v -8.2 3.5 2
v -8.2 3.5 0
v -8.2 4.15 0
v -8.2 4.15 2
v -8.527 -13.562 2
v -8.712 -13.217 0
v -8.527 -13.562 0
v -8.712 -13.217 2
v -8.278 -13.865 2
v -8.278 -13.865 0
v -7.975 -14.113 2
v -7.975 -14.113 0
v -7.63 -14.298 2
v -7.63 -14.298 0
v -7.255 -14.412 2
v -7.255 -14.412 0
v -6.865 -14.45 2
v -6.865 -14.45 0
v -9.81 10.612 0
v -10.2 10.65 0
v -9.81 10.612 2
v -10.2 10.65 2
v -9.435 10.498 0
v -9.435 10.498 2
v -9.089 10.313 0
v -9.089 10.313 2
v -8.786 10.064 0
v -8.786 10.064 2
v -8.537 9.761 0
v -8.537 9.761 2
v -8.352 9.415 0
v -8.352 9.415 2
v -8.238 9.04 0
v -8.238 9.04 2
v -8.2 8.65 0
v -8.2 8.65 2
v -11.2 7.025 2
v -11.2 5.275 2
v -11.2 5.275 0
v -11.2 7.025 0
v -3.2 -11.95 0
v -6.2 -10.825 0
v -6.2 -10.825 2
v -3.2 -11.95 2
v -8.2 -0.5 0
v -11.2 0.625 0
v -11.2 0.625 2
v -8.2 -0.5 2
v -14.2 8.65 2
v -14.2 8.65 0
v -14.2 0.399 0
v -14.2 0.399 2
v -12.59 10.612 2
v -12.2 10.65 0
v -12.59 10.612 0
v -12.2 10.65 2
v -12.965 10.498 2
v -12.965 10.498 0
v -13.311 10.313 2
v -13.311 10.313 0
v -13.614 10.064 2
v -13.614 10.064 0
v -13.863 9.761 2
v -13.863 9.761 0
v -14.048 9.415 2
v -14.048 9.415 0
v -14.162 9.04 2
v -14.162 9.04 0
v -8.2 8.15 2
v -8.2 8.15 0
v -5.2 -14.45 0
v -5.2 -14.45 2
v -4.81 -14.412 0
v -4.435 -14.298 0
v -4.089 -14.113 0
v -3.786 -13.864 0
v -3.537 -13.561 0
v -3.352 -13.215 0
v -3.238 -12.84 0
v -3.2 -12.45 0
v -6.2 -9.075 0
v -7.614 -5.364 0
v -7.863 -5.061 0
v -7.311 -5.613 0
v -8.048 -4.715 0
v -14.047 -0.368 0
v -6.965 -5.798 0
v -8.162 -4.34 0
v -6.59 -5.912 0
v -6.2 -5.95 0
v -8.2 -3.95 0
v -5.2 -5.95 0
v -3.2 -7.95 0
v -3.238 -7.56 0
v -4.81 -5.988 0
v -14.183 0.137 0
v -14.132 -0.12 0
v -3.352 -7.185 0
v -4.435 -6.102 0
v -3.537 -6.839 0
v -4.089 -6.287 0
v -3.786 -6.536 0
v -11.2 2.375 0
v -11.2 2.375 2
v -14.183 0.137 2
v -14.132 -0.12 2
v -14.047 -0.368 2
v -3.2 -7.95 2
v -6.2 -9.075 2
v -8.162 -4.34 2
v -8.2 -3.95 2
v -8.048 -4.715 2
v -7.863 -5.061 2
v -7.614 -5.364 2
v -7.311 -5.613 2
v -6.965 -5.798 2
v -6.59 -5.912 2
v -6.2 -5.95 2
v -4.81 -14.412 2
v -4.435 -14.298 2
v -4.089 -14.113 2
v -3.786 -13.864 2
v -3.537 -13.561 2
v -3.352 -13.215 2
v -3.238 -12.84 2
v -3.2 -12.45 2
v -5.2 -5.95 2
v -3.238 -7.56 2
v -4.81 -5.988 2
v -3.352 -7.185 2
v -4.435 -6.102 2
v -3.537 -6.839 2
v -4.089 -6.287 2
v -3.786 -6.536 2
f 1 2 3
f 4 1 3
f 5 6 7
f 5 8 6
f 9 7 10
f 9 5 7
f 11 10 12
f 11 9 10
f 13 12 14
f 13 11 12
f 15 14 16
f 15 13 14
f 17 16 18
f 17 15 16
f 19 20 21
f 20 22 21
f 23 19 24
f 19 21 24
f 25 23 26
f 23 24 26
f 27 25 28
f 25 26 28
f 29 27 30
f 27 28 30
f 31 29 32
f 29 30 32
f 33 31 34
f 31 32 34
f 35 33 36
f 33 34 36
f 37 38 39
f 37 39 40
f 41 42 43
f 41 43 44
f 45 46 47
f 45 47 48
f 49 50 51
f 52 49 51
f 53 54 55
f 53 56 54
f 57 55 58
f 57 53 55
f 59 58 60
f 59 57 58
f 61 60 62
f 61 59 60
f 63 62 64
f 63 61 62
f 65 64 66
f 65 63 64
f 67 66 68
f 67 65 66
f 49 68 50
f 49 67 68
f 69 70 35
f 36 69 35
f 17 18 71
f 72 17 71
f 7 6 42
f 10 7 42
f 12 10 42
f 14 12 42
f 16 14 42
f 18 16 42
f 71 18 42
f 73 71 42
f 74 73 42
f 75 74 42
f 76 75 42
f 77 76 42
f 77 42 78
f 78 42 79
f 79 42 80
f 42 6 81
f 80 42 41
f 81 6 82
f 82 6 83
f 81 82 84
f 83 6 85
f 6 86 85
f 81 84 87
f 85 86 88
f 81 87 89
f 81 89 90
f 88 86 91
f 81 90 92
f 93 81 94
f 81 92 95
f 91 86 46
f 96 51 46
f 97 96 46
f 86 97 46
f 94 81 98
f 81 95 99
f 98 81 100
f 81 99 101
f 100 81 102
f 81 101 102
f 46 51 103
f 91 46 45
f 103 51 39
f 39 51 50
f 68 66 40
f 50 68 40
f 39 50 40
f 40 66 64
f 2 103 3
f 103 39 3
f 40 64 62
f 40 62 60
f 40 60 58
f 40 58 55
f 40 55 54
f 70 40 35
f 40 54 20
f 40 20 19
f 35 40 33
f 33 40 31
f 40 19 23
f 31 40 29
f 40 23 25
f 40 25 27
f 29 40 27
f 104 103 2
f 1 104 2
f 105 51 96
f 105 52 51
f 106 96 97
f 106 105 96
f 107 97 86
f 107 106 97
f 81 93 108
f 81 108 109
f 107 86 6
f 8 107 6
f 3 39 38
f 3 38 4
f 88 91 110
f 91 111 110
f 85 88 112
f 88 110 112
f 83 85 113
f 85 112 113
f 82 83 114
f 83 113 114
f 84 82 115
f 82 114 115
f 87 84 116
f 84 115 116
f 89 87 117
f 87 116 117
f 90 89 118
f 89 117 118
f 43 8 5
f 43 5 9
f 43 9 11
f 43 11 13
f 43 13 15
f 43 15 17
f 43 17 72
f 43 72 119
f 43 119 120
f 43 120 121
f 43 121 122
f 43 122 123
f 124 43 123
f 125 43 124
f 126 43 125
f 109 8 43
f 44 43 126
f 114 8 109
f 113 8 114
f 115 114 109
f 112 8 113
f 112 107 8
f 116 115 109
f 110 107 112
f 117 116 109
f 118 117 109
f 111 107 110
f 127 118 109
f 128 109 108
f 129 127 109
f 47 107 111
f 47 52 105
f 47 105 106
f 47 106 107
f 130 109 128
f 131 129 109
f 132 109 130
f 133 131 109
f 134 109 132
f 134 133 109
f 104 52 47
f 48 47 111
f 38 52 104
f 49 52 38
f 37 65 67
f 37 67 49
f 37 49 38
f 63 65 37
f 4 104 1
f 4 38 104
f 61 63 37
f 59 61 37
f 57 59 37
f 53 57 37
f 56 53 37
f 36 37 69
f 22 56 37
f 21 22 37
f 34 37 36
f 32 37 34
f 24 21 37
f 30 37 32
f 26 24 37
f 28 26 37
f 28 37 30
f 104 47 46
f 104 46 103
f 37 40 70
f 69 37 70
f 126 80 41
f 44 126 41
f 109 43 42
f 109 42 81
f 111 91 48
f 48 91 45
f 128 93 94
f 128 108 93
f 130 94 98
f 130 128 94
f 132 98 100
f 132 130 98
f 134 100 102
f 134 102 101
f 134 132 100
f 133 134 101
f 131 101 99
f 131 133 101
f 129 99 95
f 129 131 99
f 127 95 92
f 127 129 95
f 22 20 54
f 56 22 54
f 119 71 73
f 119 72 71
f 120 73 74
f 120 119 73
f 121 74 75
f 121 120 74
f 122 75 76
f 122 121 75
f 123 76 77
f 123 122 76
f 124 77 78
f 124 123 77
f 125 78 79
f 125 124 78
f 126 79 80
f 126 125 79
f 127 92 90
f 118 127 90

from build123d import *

# Parameters (mm, degrees)
F1_DEPTH     = 2
F2_R         = 2
F3_R         = 2
F4_T4_DEPTH  = 22.7509646446
F4_T9_DEPTH  = 22.7509646446
F4_T14_DEPTH = 22.7509646446
F5_T4_DEPTH  = 22.7509646446
F5_T9_DEPTH  = 22.7509646446
F6_T4_DEPTH  = 22.7509646446


# Not quite as in the source:
# - a fillet or chamfer that OpenCascade refuses, or shapes differently, is made with other operations: its cross-section is extruded or revolved along the edge and cut away or added


with BuildPart() as f1:
    # F0 (on Top) → F1 (new body)
    with BuildSketch(Plane.XY):
        Polygon((-8.2, 10.65), (-14.2, 10.65), (-14.2, 0), (-8.2, -14.45), (-3.2, -14.45), (-3.2, -10.45), (-6.2, -10.45), (-6.2, -9.45), (-3.2, -9.45), (-3.2, -5.95), (-8.2, -5.95), (-8.2, 1), (-11.2, 1), (-11.2, 2), (-8.2, 2), (-8.2, 5.65), (-11.2, 5.65), (-11.2, 6.65), (-8.2, 6.65), align=None)
    extrude(amount=F1_DEPTH)

    # F2
    f2_edges = [f1.edges().sort_by_distance(p)[0] for p in [
        (-14.2, 10.65, 1),
        (-14.2, 0, 1),
        (-8.2, 10.65, 1),
        (-8.2, -14.45, 1),
        (-3.2, -14.45, 1),
        (-3.2, -5.95, 1),
    ]]
    fillet(f2_edges, radius=F2_R)

    # F3
    f3_edges = [f1.edges().sort_by_distance(p)[0] for p in [
        (-8.2, -5.95, 1),
    ]]
    fillet(f3_edges, radius=F3_R)

    # F4: chamfer of 1.5 x 4 on 3 edges, made by hand


with BuildPart() as f4_tool2:
    # F4_s3 → F4_t4 (new body)
    with BuildSketch(Plane.XY.offset(-10.3754823223)):
        Polygon((-12.2, 6.65), (-8.2, 8.15), (-8.2, 6.65), align=None)
    extrude(amount=F4_T4_DEPTH)

    split(bisect_by=Plane.YZ.offset(-11.2), keep=Keep.TOP)


with BuildPart() as f1_1:
    add(f1.part)

    # F4_t1: cut F4_tool2
    add(f4_tool2.part, mode=Mode.SUBTRACT)


with BuildPart() as f4_tool7:
    # F4_s8 → F4_t9 (new body)
    with BuildSketch(Plane.XY.offset(-10.3754823223)):
        Polygon((-12.2, 2), (-8.2, 3.5), (-8.2, 2), align=None)
    extrude(amount=F4_T9_DEPTH)

    split(bisect_by=Plane.YZ.offset(-11.2), keep=Keep.TOP)


with BuildPart() as f1_2:
    add(f1_1.part)

    # F4_t6: cut F4_tool7
    add(f4_tool7.part, mode=Mode.SUBTRACT)


with BuildPart() as f4_tool12:
    # F4_s13 → F4_t14 (new body)
    with BuildSketch(Plane.XY.offset(-10.3754823223)):
        Polygon((-3.2, -7.95), (-7.2, -9.45), (-3.2, -9.45), align=None)
    extrude(amount=F4_T14_DEPTH)

    split(bisect_by=Plane.YZ.offset(-6.2), keep=Keep.TOP)


with BuildPart() as f1_3:
    add(f1_2.part)

    # F4_t11: cut F4_tool12
    add(f4_tool12.part, mode=Mode.SUBTRACT)

    # F5: chamfer of 4 x 1.5 on 2 edges, made by hand


with BuildPart() as f5_tool2:
    # F5_s3 → F5_t4 (new body)
    with BuildSketch(Plane.XY.offset(-10.3754823223)):
        Polygon((-12.2, 5.65), (-8.2, 4.15), (-8.2, 5.65), align=None)
    extrude(amount=F5_T4_DEPTH)

    split(bisect_by=Plane.YZ.offset(-11.2), keep=Keep.TOP)


with BuildPart() as f1_4:
    add(f1_3.part)

    # F5_t1: cut F5_tool2
    add(f5_tool2.part, mode=Mode.SUBTRACT)


with BuildPart() as f5_tool7:
    # F5_s8 → F5_t9 (new body)
    with BuildSketch(Plane.XY.offset(-10.3754823223)):
        Polygon((-7.2, -10.45), (-3.2, -11.95), (-3.2, -10.45), align=None)
    extrude(amount=F5_T9_DEPTH)

    split(bisect_by=Plane.YZ.offset(-6.2), keep=Keep.TOP)


with BuildPart() as f1_5:
    add(f1_4.part)

    # F5_t6: cut F5_tool7
    add(f5_tool7.part, mode=Mode.SUBTRACT)

    # F6: chamfer of 4 x 1.5 on 1 edges, made by hand


with BuildPart() as f6_tool2:
    # F6_s3 → F6_t4 (new body)
    with BuildSketch(Plane.XY.offset(-10.3754823223)):
        Polygon((-12.2, 1), (-8.2, -0.5), (-8.2, 1), align=None)
    extrude(amount=F6_T4_DEPTH)

    split(bisect_by=Plane.YZ.offset(-11.2), keep=Keep.TOP)


with BuildPart() as f1_6:
    add(f1_5.part)

    # F6_t1: cut F6_tool2
    add(f6_tool2.part, mode=Mode.SUBTRACT)


solid = f1_6.part
